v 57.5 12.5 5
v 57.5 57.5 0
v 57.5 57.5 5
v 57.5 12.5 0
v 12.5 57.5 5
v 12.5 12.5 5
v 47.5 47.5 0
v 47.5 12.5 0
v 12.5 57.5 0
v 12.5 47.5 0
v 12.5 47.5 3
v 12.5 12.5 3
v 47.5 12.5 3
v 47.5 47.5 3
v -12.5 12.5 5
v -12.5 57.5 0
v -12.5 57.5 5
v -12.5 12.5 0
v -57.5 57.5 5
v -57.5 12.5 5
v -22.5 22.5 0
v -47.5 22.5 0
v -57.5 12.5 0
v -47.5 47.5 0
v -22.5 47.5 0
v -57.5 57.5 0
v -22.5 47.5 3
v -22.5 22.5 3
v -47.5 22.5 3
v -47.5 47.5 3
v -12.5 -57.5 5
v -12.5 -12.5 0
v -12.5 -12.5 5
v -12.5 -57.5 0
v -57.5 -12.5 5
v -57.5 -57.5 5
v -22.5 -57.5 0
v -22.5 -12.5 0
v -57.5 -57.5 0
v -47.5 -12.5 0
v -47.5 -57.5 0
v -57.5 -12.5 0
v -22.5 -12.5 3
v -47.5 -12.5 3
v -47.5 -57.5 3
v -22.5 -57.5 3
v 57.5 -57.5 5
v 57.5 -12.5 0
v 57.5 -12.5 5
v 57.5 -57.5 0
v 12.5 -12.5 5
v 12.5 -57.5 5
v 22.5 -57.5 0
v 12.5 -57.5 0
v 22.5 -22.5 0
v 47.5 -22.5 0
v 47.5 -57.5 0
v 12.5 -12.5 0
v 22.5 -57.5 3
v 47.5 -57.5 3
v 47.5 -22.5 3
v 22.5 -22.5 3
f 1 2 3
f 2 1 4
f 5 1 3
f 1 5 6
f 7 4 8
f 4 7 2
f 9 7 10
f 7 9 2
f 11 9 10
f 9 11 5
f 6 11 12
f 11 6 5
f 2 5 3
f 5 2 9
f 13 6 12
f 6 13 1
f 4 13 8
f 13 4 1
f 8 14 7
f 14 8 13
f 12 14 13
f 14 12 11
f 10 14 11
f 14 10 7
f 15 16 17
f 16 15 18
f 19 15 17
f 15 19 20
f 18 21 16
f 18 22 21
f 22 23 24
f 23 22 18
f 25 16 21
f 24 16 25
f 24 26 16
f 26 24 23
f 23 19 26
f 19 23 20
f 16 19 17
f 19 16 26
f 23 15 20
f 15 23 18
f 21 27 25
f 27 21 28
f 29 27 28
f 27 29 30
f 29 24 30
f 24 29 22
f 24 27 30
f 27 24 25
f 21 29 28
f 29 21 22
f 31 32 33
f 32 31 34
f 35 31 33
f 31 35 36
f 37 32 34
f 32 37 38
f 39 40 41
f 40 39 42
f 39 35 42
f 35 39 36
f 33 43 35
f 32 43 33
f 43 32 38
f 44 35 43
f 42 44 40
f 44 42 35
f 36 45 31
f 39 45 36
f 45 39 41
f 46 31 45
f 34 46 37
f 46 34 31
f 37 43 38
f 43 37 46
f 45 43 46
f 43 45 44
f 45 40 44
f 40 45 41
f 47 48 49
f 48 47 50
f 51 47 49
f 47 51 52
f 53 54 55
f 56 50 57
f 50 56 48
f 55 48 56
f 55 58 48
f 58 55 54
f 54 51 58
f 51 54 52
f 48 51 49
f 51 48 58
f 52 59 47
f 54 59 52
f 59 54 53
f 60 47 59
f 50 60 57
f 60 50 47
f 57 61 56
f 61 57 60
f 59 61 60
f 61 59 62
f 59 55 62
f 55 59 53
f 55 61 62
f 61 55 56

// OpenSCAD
square_width = 45;
square_height = 5;

anchor_width = 10;

small_square_width = square_width - anchor_width*2;
small_square_height = square_height - 2;

//*
// anchors on side 1 and 2
translate([35, 35, 0])
difference(){
translate([-square_width/2, -square_width/2, 0])
cube([square_width, square_width, square_height]);

translate([-anchor_width, -anchor_width, 0])
translate([-square_width/2, -square_width/2, 0])
cube([square_width, square_width, small_square_height]);
}
// */

//*
// anchors on side 1, 2, 3, and 4
translate([-35, 35, 0])
difference(){
translate([-square_width/2, -square_width/2, 0])
cube([square_width, square_width, square_height]);

translate([-small_square_width/2, -small_square_width/2, 0])
cube([small_square_width, small_square_width, small_square_height]);
}
// */

//*
// anchors on side 1 and 3
translate([-35, -35, 0])
difference(){
translate([-square_width/2, -square_width/2, 0])
cube([square_width, square_width, square_height]);

translate([-small_square_width/2, -square_width/2, 0])
cube([small_square_width, square_width, small_square_height]);
}
// */

//*
// anchors on side 1, 2, and 3
translate([35, -35, 0])
difference(){
translate([-square_width/2, -square_width/2, 0])
cube([square_width, square_width, square_height]);

translate([-small_square_width/2, -square_width/2-anchor_width, 0])
cube([small_square_width, square_width, small_square_height]);
}
// */
